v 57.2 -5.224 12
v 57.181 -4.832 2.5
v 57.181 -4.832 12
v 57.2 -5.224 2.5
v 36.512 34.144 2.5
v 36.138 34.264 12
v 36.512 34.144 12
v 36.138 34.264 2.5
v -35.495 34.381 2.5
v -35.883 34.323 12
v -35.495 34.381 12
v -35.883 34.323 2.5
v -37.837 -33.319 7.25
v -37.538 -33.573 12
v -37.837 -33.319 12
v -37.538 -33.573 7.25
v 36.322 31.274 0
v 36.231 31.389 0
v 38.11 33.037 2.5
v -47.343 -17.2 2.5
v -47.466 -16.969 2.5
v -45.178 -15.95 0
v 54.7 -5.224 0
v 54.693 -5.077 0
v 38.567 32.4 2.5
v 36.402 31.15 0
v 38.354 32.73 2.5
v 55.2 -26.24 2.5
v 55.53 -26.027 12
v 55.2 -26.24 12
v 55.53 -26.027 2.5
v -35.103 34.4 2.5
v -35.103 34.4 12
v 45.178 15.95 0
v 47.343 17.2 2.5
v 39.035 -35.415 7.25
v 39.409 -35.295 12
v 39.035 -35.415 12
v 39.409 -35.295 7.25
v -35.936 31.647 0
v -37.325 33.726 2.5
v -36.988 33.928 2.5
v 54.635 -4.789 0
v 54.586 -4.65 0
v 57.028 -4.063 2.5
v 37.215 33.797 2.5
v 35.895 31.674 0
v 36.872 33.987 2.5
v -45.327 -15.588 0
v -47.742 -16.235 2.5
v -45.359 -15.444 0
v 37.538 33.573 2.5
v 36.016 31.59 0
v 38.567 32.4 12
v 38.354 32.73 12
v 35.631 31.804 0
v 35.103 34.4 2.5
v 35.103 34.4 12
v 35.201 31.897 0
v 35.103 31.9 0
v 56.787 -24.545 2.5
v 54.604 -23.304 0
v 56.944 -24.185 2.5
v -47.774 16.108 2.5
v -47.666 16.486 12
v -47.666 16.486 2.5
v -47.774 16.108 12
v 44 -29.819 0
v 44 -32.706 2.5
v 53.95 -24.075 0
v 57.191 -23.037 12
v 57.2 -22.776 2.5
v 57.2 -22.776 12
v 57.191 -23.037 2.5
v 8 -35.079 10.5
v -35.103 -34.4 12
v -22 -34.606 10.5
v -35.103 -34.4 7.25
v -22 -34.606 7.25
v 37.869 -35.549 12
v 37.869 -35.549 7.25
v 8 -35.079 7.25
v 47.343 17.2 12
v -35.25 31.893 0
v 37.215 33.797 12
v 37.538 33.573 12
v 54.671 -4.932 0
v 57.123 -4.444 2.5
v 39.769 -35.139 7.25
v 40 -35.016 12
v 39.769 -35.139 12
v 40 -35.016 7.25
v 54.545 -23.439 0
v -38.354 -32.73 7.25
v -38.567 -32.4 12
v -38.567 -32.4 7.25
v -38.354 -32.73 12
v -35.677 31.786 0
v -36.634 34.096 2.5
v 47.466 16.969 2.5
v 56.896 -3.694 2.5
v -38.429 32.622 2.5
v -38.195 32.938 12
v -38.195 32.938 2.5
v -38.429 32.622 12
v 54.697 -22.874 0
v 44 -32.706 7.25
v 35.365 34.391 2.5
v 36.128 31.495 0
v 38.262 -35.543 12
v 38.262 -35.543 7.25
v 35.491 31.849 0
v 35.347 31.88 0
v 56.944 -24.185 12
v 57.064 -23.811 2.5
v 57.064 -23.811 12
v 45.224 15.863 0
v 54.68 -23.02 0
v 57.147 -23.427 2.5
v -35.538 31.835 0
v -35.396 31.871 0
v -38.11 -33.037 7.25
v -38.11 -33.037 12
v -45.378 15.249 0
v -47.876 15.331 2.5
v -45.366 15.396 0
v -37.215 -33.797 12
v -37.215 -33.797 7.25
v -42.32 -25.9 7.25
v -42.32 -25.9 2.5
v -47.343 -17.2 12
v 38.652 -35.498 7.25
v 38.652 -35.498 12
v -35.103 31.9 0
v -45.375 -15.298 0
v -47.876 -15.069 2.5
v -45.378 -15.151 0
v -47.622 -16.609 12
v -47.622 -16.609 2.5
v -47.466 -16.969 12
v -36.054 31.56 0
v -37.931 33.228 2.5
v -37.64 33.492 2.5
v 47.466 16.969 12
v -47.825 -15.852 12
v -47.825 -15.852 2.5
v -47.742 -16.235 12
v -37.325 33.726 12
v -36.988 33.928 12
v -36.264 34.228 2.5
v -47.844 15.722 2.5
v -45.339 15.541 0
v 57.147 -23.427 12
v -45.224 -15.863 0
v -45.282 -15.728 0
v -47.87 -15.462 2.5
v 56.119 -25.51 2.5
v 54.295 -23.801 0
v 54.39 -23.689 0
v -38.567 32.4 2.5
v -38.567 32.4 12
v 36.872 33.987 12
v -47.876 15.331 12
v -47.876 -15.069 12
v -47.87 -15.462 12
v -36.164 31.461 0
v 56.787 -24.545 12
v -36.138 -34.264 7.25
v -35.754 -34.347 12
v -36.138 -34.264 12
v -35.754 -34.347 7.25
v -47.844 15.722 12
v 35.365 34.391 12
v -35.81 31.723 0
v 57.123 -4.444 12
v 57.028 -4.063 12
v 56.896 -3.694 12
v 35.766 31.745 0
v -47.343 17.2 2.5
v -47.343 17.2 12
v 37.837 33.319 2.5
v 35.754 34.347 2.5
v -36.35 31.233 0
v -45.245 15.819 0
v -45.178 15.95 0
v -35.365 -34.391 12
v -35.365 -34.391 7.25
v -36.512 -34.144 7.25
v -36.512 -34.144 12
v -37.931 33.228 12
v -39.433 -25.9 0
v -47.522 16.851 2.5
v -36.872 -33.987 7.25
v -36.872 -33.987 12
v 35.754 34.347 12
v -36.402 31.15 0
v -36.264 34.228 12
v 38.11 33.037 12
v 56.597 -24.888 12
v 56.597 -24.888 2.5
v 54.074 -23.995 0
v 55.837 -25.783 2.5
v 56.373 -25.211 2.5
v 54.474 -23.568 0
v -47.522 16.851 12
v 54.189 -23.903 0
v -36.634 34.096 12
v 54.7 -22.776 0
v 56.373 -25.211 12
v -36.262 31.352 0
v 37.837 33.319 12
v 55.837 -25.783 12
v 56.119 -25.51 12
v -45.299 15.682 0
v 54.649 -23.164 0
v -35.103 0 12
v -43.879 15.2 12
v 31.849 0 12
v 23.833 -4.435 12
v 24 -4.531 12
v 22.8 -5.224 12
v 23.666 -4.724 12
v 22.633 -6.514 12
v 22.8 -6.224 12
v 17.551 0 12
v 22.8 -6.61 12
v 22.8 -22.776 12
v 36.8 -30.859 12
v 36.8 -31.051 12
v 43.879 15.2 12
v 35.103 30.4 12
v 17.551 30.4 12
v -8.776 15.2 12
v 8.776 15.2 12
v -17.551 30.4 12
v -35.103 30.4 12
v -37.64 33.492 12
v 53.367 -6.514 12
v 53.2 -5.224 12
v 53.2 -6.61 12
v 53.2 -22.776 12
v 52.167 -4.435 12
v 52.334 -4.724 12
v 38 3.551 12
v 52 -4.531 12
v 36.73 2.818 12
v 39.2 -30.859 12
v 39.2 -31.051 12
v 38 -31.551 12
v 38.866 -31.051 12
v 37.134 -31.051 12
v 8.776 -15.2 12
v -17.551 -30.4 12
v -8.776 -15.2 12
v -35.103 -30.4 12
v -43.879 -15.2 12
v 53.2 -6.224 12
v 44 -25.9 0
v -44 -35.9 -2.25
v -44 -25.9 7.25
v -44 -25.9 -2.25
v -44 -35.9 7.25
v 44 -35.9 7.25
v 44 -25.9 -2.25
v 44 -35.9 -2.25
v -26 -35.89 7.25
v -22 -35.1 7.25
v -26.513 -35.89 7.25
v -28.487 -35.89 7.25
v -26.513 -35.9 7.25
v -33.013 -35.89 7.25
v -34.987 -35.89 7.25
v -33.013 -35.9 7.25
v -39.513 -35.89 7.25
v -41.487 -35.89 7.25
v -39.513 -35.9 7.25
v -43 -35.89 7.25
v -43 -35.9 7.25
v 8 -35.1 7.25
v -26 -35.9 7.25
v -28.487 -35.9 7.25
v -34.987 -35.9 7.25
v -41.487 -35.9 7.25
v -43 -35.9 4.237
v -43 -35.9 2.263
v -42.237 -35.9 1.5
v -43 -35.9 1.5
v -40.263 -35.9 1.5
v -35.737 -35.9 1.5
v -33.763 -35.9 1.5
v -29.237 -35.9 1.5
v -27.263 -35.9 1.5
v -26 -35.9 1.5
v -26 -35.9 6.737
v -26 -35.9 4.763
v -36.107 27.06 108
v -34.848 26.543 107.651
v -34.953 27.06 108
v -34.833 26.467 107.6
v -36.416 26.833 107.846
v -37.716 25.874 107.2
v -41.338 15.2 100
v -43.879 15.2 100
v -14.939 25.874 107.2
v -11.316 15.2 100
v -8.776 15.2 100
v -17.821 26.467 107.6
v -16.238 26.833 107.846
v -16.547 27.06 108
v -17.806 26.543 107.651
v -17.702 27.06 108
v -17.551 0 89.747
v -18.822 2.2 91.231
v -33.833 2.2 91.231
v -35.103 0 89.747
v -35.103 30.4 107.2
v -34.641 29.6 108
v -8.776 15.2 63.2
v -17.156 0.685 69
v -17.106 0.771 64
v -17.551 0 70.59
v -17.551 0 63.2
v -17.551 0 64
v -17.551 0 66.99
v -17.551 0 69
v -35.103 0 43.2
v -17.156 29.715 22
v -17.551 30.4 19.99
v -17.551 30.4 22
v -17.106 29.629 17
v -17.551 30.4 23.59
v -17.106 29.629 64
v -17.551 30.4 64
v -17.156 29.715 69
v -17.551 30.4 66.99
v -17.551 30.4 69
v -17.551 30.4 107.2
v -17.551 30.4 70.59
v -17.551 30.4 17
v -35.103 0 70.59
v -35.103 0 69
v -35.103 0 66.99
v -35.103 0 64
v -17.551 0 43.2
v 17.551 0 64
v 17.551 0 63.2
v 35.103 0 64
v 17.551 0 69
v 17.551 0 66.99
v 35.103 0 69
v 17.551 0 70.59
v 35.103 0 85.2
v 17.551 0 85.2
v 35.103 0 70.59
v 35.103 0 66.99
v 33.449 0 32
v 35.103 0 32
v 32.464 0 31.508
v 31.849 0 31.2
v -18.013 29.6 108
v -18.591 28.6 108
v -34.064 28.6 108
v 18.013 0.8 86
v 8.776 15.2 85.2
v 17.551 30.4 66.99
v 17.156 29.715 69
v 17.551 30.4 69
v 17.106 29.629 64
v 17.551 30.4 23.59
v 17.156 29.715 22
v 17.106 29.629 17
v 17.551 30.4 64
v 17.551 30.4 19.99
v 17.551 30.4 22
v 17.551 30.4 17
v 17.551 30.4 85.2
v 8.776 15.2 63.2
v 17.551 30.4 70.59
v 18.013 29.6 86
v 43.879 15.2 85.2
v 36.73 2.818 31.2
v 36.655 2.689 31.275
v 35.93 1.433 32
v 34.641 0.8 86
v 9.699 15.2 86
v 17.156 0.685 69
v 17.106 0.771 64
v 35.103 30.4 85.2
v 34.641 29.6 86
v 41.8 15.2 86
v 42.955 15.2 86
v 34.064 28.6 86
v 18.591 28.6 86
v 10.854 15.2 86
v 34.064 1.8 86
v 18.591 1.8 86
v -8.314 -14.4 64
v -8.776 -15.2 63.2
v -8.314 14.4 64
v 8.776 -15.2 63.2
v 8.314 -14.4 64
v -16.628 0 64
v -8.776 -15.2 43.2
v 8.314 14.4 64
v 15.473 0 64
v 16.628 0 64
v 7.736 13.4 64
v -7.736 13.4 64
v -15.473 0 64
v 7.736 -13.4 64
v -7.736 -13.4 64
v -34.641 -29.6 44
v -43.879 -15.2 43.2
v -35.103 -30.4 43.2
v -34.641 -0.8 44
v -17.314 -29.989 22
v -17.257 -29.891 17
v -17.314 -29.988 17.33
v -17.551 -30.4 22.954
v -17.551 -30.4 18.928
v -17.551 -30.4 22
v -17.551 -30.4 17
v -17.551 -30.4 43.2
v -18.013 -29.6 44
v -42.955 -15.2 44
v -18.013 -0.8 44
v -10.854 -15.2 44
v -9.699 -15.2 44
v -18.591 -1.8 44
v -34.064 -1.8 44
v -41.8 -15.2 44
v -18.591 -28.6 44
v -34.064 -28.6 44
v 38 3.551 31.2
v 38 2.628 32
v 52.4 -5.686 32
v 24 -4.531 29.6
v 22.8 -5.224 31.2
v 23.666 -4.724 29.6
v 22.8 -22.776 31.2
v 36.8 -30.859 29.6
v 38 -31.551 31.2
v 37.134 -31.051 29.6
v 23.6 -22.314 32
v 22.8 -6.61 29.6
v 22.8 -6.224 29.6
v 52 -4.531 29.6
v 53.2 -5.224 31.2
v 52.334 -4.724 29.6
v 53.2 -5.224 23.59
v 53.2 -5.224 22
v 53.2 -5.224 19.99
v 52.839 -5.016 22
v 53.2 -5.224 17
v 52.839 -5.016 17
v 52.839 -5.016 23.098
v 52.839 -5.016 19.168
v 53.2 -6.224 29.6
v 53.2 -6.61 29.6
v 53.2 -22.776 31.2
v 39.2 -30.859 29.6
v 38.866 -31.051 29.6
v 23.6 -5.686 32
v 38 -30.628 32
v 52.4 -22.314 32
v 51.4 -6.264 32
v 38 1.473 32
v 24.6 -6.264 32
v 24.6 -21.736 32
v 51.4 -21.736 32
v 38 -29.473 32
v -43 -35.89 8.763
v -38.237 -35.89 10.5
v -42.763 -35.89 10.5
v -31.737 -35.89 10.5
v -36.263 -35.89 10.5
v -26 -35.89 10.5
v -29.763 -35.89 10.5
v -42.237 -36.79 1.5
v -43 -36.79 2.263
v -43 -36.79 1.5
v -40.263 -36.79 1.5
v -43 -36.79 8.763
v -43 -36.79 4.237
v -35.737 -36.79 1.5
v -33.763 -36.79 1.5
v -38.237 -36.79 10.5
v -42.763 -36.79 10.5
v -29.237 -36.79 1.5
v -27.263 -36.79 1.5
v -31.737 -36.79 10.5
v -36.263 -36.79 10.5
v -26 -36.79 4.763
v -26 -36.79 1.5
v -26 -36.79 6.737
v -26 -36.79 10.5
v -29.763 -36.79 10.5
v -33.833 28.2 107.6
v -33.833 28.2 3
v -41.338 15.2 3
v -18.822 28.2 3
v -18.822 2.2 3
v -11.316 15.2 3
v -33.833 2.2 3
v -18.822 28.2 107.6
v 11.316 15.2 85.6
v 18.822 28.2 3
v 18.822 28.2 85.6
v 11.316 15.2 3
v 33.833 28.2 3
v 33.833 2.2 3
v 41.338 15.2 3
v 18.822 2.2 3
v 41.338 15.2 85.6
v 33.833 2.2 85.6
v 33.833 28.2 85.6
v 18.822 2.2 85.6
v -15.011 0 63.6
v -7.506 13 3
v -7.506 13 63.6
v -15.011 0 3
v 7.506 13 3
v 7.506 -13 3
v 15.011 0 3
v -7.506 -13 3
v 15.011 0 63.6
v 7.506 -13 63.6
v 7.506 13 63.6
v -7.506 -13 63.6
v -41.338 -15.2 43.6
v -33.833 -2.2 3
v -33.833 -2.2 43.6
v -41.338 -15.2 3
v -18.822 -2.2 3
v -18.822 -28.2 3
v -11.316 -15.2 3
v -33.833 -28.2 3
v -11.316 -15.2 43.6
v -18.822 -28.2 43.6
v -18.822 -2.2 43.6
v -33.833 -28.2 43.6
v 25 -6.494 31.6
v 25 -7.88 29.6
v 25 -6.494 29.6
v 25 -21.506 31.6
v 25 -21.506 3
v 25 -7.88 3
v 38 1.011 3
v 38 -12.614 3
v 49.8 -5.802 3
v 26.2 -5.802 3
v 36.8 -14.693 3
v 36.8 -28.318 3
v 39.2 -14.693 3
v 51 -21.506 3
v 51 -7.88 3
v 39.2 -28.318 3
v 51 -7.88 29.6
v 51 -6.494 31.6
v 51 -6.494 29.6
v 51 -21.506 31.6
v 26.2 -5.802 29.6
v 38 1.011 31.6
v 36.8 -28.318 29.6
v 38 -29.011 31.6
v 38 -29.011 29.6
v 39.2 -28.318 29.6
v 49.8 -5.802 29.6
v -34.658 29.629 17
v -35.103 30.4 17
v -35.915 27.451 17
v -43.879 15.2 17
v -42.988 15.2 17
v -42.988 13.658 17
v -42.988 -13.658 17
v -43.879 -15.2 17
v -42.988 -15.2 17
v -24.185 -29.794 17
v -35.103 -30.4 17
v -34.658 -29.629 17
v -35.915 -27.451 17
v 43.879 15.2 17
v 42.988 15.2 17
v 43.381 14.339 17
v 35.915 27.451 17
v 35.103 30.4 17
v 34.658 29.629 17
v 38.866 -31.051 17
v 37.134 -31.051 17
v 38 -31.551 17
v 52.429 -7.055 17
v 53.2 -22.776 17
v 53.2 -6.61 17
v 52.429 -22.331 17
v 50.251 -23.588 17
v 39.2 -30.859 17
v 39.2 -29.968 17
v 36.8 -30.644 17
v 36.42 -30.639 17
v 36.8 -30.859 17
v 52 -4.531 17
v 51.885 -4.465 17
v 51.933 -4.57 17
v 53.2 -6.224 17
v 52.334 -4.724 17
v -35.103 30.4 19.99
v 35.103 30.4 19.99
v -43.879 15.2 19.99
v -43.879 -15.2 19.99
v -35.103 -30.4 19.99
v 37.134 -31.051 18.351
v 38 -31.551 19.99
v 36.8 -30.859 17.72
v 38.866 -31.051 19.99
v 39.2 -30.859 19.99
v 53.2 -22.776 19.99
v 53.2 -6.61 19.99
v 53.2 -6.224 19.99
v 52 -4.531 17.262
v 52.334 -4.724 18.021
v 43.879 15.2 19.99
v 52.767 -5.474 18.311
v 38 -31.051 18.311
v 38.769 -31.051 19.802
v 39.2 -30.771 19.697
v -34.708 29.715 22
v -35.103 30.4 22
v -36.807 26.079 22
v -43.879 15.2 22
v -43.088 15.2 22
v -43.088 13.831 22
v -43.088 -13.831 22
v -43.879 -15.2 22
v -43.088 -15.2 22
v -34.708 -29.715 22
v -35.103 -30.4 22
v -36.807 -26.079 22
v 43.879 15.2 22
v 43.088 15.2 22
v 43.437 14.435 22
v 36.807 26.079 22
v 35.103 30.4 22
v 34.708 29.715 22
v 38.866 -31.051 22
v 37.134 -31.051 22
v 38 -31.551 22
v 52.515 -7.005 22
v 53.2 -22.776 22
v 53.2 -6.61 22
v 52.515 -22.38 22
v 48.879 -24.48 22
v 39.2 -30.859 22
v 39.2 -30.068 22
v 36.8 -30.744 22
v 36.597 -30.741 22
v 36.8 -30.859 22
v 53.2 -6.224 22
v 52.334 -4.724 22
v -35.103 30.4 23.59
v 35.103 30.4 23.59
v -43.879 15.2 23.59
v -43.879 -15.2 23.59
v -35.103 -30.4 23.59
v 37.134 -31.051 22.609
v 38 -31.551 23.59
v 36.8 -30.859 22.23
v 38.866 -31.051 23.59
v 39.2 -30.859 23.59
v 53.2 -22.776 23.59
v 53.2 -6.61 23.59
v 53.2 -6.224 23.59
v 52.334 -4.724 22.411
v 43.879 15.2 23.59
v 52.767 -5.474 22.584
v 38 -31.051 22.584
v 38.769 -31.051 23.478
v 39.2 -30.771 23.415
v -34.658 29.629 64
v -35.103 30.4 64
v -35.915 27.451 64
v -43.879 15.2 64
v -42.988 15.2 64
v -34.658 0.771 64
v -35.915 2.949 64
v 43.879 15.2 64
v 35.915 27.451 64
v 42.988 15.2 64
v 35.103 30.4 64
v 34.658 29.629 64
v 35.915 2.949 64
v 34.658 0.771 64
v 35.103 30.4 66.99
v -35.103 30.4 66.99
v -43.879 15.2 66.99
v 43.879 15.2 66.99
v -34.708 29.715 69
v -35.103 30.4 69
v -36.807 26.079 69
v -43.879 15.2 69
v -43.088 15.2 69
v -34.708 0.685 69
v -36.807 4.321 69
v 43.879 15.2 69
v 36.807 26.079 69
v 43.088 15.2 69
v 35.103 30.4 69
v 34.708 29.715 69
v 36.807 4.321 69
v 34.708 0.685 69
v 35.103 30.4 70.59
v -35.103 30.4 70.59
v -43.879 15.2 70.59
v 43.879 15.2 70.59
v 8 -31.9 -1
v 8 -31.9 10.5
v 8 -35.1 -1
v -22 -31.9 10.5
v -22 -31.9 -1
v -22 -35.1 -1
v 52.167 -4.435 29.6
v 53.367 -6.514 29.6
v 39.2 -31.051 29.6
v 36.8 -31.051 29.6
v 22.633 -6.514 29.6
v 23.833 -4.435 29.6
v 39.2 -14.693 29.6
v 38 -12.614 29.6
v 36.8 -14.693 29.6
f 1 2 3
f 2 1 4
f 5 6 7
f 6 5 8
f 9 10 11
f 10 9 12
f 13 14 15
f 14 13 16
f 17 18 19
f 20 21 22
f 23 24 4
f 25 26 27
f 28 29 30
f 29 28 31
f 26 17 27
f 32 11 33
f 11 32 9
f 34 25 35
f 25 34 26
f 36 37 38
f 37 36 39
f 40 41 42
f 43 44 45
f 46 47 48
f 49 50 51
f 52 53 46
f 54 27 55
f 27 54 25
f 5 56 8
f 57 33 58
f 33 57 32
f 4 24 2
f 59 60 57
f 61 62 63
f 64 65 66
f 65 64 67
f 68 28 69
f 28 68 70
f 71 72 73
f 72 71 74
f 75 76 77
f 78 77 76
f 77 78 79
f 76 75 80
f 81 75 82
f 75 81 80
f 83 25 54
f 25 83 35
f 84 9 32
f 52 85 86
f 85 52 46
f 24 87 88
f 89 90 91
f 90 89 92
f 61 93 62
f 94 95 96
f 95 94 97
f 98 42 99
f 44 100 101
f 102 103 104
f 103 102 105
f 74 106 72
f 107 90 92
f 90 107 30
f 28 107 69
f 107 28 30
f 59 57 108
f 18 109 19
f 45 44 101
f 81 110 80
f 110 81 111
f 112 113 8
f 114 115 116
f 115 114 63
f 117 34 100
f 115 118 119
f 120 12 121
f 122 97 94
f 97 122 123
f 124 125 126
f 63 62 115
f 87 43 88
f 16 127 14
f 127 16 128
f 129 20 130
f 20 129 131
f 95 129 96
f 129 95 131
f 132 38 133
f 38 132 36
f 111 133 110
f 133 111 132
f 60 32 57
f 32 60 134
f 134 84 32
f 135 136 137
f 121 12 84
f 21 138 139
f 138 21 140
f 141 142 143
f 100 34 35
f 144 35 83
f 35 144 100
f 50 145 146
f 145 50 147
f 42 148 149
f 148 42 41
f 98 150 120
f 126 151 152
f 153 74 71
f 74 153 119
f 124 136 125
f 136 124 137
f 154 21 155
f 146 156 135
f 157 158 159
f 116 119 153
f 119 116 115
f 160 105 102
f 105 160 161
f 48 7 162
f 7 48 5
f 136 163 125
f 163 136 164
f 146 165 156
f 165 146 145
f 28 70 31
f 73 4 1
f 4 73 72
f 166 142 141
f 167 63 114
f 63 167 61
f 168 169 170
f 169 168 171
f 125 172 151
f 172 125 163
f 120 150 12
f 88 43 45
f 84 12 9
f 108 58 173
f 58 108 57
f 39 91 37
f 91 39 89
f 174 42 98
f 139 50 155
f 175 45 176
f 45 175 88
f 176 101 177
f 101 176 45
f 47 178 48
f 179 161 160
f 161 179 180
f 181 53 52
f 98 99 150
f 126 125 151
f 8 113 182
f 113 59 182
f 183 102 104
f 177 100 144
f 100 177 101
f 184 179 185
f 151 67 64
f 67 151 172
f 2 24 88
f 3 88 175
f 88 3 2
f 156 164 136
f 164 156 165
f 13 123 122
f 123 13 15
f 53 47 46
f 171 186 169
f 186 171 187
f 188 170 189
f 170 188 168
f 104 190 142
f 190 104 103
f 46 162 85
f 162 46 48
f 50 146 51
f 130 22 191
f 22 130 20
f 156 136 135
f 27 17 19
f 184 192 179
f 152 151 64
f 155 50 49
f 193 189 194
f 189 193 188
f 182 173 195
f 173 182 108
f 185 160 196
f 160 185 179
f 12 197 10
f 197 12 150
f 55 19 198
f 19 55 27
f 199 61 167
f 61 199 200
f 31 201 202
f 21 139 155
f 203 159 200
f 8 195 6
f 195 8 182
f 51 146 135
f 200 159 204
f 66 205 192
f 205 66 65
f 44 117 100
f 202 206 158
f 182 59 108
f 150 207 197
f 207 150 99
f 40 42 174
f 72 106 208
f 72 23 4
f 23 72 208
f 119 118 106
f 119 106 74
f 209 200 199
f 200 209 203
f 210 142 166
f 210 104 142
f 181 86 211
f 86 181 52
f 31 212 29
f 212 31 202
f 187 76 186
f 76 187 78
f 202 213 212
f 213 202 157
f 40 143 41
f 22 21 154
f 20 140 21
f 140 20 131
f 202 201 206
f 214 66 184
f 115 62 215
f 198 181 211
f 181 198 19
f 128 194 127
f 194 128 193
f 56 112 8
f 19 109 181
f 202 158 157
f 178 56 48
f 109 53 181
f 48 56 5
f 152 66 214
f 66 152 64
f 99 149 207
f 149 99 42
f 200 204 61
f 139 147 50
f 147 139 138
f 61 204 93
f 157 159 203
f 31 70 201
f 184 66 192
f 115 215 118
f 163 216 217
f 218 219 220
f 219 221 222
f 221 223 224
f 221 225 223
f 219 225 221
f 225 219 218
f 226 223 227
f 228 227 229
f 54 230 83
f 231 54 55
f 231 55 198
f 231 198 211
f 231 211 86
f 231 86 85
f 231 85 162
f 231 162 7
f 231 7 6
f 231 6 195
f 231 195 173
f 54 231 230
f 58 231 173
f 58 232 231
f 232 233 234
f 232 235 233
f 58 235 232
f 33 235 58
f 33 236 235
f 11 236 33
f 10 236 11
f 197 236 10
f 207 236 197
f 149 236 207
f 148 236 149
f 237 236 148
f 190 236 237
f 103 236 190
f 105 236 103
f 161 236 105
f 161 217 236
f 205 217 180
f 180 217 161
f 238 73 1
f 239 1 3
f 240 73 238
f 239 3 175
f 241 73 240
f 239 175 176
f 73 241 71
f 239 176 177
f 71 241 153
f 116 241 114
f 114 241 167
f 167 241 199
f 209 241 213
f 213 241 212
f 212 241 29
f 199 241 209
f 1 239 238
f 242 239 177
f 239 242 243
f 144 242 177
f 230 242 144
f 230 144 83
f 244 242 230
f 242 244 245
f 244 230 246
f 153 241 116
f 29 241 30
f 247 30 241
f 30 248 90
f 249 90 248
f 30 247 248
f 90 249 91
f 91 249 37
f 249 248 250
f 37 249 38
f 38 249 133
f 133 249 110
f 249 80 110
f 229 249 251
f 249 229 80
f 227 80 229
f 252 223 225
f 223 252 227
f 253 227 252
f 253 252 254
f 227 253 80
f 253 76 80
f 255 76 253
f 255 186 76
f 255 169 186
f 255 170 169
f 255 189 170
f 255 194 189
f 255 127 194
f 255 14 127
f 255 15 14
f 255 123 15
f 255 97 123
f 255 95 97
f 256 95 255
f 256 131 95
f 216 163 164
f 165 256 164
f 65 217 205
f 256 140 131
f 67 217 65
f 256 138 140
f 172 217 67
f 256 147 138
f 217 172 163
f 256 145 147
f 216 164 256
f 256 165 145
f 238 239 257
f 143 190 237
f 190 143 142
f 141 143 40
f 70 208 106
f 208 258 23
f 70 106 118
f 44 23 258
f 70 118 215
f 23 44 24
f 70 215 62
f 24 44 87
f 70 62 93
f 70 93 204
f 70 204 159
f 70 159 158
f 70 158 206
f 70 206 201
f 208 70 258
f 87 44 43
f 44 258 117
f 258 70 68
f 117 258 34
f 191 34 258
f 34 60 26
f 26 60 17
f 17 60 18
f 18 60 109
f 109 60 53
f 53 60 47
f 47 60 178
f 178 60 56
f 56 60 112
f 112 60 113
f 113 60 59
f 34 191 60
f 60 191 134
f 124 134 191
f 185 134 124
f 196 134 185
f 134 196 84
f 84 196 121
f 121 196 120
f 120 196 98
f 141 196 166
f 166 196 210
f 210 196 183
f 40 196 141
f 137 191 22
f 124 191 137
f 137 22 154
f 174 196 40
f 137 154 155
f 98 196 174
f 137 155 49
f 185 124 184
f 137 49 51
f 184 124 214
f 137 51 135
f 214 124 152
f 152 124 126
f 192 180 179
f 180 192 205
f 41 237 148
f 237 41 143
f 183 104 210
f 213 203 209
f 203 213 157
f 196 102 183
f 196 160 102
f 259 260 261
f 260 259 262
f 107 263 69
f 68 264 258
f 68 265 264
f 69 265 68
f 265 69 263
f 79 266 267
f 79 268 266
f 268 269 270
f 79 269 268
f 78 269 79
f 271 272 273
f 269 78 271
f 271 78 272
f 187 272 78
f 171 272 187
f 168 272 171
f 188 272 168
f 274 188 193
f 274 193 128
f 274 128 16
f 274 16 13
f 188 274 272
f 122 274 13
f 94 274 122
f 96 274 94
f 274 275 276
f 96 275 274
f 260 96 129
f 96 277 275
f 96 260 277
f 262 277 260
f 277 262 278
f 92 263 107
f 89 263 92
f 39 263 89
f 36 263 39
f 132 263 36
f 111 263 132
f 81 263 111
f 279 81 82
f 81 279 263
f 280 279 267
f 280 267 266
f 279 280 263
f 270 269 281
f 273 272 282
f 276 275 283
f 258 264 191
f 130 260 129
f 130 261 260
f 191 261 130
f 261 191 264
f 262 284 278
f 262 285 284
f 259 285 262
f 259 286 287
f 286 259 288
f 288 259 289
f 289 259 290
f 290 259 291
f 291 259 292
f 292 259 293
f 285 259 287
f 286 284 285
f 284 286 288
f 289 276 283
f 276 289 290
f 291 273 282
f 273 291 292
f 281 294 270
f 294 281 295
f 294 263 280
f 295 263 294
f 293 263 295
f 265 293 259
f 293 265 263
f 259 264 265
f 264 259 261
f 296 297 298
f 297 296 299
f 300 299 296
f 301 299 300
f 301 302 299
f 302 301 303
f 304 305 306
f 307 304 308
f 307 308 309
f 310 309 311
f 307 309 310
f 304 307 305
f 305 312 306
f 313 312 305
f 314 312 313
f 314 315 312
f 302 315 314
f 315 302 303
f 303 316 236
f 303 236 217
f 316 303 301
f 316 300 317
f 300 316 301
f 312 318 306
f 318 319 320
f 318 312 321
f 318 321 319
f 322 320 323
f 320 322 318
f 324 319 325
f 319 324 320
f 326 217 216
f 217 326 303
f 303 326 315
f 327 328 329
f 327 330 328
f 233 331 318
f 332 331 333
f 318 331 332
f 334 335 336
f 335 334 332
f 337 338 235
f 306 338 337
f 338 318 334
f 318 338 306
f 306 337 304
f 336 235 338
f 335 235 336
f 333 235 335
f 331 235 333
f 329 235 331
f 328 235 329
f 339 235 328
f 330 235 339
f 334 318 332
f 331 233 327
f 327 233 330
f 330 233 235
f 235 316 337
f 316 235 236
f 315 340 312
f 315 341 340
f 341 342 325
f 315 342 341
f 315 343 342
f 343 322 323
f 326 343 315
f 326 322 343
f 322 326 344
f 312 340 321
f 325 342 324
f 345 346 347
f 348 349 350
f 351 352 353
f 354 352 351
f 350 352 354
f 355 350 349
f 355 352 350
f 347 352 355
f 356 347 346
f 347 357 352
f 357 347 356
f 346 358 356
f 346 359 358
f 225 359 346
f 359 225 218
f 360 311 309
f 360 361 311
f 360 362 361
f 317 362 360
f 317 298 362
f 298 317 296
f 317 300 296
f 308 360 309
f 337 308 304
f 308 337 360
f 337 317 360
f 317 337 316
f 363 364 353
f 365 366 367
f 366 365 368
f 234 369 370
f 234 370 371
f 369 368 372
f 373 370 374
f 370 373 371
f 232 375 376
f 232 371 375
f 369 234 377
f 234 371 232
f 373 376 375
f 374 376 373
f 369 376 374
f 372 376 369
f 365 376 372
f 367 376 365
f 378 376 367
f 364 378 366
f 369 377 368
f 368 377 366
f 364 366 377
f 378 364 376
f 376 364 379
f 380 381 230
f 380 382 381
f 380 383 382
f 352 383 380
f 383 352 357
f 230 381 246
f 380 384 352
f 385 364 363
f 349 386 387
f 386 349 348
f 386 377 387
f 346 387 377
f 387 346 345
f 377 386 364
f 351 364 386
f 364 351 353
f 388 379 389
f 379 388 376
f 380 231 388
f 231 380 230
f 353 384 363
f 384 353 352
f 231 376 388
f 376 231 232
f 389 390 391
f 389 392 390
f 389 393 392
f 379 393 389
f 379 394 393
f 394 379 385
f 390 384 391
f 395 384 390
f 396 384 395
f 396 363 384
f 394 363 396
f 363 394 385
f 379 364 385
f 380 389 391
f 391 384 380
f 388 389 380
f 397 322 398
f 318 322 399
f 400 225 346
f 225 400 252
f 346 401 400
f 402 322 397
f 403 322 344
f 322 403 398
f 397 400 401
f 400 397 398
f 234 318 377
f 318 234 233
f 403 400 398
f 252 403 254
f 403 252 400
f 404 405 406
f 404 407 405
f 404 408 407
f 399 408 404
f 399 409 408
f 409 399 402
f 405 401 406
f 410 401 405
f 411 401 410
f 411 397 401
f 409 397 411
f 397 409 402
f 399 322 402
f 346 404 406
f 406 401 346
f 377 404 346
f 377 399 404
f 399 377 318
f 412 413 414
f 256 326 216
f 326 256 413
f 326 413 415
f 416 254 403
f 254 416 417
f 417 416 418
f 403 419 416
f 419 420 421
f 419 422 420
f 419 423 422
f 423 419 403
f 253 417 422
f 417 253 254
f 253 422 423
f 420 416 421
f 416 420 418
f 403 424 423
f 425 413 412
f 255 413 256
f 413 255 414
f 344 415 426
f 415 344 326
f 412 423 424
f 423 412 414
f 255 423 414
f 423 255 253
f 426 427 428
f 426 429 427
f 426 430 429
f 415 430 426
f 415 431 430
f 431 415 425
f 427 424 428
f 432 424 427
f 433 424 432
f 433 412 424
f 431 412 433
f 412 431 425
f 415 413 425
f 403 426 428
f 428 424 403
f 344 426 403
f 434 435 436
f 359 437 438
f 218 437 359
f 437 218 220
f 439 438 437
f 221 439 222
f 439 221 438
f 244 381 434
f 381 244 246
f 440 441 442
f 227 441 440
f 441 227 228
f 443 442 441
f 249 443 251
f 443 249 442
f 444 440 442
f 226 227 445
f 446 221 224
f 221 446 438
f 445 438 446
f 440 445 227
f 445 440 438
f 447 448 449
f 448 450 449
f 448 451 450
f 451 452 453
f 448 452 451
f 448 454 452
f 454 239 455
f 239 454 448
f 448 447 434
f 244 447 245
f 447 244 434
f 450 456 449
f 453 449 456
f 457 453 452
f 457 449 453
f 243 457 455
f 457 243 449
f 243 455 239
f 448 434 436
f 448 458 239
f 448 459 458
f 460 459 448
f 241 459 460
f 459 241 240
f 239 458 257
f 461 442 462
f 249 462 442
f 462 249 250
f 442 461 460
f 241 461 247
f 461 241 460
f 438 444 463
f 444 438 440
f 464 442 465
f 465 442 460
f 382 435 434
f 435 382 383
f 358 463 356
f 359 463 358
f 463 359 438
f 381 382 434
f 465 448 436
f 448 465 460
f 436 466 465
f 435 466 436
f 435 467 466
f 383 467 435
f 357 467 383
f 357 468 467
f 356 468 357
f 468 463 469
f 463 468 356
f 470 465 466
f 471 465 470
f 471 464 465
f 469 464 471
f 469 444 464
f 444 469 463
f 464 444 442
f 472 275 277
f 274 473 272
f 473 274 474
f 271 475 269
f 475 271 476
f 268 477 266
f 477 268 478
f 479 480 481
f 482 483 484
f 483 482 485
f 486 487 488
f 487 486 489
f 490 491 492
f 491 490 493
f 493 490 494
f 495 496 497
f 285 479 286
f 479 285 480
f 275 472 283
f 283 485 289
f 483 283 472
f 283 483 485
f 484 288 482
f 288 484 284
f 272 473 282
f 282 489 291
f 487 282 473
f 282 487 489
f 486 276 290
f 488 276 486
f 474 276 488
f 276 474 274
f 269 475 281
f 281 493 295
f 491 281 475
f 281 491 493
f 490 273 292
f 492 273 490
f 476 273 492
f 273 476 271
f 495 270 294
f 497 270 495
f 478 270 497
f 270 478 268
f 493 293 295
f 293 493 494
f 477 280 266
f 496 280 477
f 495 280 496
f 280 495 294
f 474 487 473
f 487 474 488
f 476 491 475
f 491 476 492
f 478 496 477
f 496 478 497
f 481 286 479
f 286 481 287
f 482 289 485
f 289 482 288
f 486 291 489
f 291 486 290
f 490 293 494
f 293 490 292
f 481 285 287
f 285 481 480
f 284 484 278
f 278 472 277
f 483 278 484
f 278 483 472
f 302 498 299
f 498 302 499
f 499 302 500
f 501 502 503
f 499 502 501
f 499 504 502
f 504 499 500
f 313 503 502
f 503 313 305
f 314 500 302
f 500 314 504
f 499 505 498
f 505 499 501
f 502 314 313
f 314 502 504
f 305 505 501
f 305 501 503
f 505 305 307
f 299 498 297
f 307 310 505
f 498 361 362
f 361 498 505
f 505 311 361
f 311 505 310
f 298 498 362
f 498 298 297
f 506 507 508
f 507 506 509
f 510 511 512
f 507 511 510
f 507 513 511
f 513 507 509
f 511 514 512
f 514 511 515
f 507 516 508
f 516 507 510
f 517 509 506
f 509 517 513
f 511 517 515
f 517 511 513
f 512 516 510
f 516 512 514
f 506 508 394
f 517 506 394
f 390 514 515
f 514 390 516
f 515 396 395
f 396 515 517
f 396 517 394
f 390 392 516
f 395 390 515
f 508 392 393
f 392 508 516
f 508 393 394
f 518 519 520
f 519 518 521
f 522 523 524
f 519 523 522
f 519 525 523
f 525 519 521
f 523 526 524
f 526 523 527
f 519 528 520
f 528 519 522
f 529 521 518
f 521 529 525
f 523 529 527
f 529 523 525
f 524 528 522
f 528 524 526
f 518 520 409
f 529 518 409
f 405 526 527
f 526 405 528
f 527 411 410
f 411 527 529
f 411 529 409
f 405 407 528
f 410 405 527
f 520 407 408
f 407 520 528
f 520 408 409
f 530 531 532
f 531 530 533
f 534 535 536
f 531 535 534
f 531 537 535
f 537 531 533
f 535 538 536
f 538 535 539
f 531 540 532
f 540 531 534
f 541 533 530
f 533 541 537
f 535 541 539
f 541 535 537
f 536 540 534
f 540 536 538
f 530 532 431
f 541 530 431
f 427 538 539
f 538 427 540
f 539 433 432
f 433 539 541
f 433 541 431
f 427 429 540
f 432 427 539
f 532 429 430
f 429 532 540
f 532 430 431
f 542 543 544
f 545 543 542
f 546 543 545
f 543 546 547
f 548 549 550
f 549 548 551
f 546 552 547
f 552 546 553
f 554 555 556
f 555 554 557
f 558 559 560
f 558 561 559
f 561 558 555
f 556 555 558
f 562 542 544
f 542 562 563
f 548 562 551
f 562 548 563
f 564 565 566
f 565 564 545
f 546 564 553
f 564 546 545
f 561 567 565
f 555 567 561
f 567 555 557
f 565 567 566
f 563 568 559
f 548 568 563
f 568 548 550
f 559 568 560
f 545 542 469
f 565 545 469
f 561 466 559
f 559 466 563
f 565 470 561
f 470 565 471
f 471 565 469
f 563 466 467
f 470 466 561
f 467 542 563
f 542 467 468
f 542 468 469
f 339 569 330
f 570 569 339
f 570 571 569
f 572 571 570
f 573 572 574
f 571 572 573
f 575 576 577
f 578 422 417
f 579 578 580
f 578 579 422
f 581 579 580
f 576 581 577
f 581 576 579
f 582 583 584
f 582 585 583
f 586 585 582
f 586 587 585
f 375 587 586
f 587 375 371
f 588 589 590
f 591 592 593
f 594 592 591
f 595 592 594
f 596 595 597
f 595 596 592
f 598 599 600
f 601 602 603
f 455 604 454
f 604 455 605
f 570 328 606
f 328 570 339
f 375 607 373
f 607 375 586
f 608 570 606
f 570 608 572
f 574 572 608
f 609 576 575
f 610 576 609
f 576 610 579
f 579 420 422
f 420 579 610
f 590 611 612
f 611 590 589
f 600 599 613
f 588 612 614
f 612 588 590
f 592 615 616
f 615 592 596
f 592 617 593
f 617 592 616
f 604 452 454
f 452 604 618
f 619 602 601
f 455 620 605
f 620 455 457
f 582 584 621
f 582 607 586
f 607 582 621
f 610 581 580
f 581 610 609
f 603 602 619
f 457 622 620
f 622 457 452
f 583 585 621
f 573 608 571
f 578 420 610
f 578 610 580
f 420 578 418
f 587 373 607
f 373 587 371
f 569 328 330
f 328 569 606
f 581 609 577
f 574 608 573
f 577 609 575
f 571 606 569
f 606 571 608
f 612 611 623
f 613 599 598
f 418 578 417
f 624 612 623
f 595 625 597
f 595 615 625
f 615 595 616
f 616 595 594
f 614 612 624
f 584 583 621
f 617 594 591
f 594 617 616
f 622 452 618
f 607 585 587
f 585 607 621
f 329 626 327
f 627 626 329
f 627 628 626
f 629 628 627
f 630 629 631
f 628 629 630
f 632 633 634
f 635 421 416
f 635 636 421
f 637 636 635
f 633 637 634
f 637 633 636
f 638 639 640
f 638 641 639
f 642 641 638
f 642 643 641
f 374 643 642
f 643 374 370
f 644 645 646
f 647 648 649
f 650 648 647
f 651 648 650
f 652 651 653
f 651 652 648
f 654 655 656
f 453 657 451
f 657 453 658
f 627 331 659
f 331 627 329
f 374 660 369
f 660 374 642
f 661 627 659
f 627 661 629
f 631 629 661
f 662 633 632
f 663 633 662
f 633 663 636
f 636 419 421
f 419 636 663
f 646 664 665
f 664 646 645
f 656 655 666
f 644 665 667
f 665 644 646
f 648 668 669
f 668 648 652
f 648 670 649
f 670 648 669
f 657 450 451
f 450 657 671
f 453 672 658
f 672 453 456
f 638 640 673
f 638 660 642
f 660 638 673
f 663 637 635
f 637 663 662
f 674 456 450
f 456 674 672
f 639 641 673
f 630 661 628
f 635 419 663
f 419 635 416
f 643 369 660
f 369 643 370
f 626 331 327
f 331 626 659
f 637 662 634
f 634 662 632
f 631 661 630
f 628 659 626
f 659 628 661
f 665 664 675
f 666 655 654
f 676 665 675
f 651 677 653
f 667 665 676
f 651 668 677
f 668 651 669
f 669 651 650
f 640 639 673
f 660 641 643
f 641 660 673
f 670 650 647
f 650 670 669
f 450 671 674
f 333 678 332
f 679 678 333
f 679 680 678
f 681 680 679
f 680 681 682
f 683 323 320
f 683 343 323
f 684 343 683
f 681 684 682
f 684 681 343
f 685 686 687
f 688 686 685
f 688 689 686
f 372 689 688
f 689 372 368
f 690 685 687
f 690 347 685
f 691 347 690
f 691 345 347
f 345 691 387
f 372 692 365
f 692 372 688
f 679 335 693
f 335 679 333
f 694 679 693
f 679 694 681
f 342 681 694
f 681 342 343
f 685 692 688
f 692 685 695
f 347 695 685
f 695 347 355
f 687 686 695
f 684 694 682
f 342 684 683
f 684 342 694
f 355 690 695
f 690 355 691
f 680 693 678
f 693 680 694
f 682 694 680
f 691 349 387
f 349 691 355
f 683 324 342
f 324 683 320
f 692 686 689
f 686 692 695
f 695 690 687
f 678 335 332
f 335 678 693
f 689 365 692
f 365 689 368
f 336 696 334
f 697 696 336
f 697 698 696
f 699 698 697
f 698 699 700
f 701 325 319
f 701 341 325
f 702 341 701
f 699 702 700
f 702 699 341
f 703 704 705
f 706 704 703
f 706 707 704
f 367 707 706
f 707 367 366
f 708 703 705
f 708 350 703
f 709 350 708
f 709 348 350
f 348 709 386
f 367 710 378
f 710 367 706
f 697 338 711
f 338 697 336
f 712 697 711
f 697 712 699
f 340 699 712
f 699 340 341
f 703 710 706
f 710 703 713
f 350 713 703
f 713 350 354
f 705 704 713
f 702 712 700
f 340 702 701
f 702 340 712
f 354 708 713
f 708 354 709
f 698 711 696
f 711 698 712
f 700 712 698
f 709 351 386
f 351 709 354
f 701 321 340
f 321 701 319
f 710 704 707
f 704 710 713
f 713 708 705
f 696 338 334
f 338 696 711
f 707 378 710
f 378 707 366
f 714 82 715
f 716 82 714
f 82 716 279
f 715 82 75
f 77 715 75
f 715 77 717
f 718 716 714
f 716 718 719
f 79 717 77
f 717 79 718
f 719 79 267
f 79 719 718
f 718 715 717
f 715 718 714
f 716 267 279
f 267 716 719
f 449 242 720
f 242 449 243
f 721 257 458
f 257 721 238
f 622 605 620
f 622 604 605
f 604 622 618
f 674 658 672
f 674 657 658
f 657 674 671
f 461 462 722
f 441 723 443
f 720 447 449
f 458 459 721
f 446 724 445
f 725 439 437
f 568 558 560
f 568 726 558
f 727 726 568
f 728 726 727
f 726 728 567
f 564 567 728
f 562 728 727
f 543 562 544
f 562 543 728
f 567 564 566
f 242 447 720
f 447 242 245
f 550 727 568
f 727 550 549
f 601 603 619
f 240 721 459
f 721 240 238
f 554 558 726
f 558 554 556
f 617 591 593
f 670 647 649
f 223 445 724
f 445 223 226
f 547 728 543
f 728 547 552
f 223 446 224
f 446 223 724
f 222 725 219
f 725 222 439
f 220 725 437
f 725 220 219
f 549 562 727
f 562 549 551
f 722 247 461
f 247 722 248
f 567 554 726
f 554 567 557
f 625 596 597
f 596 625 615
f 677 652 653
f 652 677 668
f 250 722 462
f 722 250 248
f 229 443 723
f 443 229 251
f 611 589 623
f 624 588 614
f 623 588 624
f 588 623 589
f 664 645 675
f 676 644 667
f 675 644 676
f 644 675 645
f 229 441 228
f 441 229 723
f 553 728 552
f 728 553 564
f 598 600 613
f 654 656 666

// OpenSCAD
// =====================================================================
//  HEX-STIFTBOX  "CYBER"  -  Cyberpunk-Variante
//  Unterschiede zur cleanen Version:
//    * asymmetrisch: die kleinste Zelle ist versetzt und um 30 Grad
//      gedreht, dazwischen bleibt eine Schattenfuge
//    * Schraegschnitt am hoechsten Turm
//    * Frontpanel mit Leuchtband, Warnstreifen und Code-Feld
//    * LED-Streifen steht senkrecht hinter einer 0,8-mm-Blende:
//      gerades Stueck, nichts muss gebogen werden
//  Druckt aufrecht, ohne Stuetzen.
// =====================================================================

/* [Zellen] */
zelle_w = 26;       // Schluesselweite innen
wand    = 2.2;      // Wandstaerke je Seite
fase_o  = 0.8;
fase_i  = 0.4;

/* [Sockel / Frontpanel] */
sockel_h  = 12;     // Hoehe des Sockelbands
boden_d   = 3;      // Bodenplatte (Zellenboden liegt hier drauf)
sockel_ue = 4;      // Ueberstand rundum
fase_s    = 2.5;    // Fase unten
panel_t   = 10;     // Tiefe des Frontpanels

/* [Licht] */
led_b      = 10.5;  // Nuthoehe fuer den senkrecht stehenden Streifen
led_t      = 3.2;   // Nuttiefe
blende     = 0.8;   // Wandstaerke der Leuchtblende
licht_x    = [-22, 8];    // Bereich des Leuchtbands

/* [Grafik] */
streifen_x = [-43, -26];  // Warnstreifen
code_x     = [ 12,  43];  // Code-Feld
code       = "";          // z.B. "07-B" oder der Gamertag
code_h     = 6;

/* [Gravur] */
nut_t  = 0.9;
gravur = [[17, 3.0], [22, 1.6], [64, 3.0], [69, 1.6]];

$fn = 64;

// ---------------------------------------------------------- Raster
w_out = zelle_w + 2*wand;
d_out = w_out / cos(30);
px    = 0.75 * d_out;
py    = w_out;

// [x, y, Hoehe, Y-Teiler, Drehung, Schraegschnitt-Winkel]
zellen = [
    [ -px,  py/2, 108, false,  0, 34],   // Stifte, oben schraeg abgeschnitten
    [  px,  py/2,  86, false,  0,  0],   // Marker
    [   0,     0,  64, false,  0,  0],   // Schere, Kleber
    [ -px, -py/2,  44, false,  0,  0],   // Kleinkram
    [  38,   -14,  32,  true, 30,  0]    // versetzt + gedreht: USB, SD-Karten
];

front_y  = -(py/2 + w_out/2) - sockel_ue - 1.5;   // Panel steht vor allen Tuermen

module hex(w) { circle(d = w / cos(30), $fn = 6); }

module kontur(z) {
    union() for (c = zellen) if (c[2] > z) translate([c[0], c[1]]) rotate(c[4]) hex(w_out);
}

// ---------------------------------------------------------- Tuerme
module tuerme() {
    for (c = zellen) difference() {
        translate([c[0], c[1], 0]) rotate([0, 0, c[4]]) hull() {
            linear_extrude(c[2] - fase_o) hex(w_out);
            translate([0, 0, c[2] - 0.01]) linear_extrude(0.01) hex(w_out - 2*fase_o);
        }
        if (c[5] > 0) intersection() {                       // Schraegschnitt
            translate([c[0], c[1], c[2] - 8]) rotate([c[5], 0, 0])
                translate([-80, -80, 0]) cube([160, 160, 80]);
            translate([c[0], c[1], 0]) linear_extrude(200) rotate(c[4]) hex(w_out + 2);
        }
    }
}

module hohlraeume() {
    for (c = zellen) translate([c[0], c[1], 0]) rotate([0, 0, c[4]]) {
        translate([0, 0, boden_d]) linear_extrude(c[2] + 20) hex(zelle_w);
        translate([0, 0, c[2] - fase_i]) hull() {            // Einfuehrtrichter
            linear_extrude(0.01) hex(zelle_w);
            translate([0, 0, fase_i]) linear_extrude(1.0) hex(zelle_w + 2*fase_i);
        }
    }
}

module teiler() {
    for (c = zellen) if (c[3])
        for (a = [0, 120, 240]) translate([c[0], c[1], boden_d]) rotate(a + c[4])
            linear_extrude(c[2] - boden_d - fase_i - 2)
                translate([0, -1.2]) square([d_out/2 - 0.5, 2.4]);
}

module rillen() {
    for (g = gravur) {
        z = g[0]; h = g[1]; zt = z + h + 3;
        difference() {
            translate([0, 0, z]) linear_extrude(h) kontur(zt);
            hull() {
                translate([0, 0, z - 0.5]) linear_extrude(h - nut_t + 0.5) offset(-nut_t) kontur(zt);
                translate([0, 0, z + h - 0.01]) linear_extrude(0.01) kontur(zt);
            }
        }
    }
}

// ---------------------------------------------------------- Sockel + Panel
module sockel_form(h, schrumpf = 0) {
    linear_extrude(h) offset(r = sockel_ue - schrumpf) kontur(0);
}

module sockel() {
    hull() {
        sockel_form(0.01, fase_s);
        translate([0, 0, fase_s]) sockel_form(sockel_h - fase_s);
    }
    // gerades Frontpanel quer ueber die Vorderseite
    hull() {
        translate([0, front_y + panel_t/2 + fase_s/2, 0])
            cube([88 - 2*fase_s, panel_t - fase_s, 0.01], center = true);
        translate([0, front_y + panel_t/2, fase_s])
            cube([88, panel_t, sockel_h - fase_s], center = true);
    }
}

// Nut fuer den senkrecht stehenden LED-Streifen, unten offen zum Einschieben
module lichtnut() {
    translate([licht_x[0], front_y + blende, -1])
        cube([licht_x[1] - licht_x[0], led_t, led_b + 1]);
}

module warnstreifen() {
    intersection() {
        translate([0, front_y + 0.01, 0]) rotate([90, 0, 0]) linear_extrude(0.9)
            for (i = [0:6]) translate([streifen_x[0] - 6 + i*6.5, 6]) rotate(45)
                square([3.2, 34], center = true);
        translate([(streifen_x[0] + streifen_x[1])/2, front_y - 1, sockel_h/2])
            cube([streifen_x[1] - streifen_x[0], 3, sockel_h - 3], center = true);
    }
}

module codefeld() {
    if (code != "")
        translate([(code_x[0] + code_x[1])/2, front_y + 0.7, sockel_h/2]) rotate([90, 0, 0])
            linear_extrude(1.4, center = true)
                text(code, size = code_h, halign = "center", valign = "center",
                     font = "DejaVu Sans:style=Bold");
}

module stiftbox_cyber() {
    union() {
        difference() {
            union() { sockel(); tuerme(); warnstreifen(); }
            hohlraeume();
            rillen();
            lichtnut();
            codefeld();
        }
        teiler();
    }
}

stiftbox_cyber();
